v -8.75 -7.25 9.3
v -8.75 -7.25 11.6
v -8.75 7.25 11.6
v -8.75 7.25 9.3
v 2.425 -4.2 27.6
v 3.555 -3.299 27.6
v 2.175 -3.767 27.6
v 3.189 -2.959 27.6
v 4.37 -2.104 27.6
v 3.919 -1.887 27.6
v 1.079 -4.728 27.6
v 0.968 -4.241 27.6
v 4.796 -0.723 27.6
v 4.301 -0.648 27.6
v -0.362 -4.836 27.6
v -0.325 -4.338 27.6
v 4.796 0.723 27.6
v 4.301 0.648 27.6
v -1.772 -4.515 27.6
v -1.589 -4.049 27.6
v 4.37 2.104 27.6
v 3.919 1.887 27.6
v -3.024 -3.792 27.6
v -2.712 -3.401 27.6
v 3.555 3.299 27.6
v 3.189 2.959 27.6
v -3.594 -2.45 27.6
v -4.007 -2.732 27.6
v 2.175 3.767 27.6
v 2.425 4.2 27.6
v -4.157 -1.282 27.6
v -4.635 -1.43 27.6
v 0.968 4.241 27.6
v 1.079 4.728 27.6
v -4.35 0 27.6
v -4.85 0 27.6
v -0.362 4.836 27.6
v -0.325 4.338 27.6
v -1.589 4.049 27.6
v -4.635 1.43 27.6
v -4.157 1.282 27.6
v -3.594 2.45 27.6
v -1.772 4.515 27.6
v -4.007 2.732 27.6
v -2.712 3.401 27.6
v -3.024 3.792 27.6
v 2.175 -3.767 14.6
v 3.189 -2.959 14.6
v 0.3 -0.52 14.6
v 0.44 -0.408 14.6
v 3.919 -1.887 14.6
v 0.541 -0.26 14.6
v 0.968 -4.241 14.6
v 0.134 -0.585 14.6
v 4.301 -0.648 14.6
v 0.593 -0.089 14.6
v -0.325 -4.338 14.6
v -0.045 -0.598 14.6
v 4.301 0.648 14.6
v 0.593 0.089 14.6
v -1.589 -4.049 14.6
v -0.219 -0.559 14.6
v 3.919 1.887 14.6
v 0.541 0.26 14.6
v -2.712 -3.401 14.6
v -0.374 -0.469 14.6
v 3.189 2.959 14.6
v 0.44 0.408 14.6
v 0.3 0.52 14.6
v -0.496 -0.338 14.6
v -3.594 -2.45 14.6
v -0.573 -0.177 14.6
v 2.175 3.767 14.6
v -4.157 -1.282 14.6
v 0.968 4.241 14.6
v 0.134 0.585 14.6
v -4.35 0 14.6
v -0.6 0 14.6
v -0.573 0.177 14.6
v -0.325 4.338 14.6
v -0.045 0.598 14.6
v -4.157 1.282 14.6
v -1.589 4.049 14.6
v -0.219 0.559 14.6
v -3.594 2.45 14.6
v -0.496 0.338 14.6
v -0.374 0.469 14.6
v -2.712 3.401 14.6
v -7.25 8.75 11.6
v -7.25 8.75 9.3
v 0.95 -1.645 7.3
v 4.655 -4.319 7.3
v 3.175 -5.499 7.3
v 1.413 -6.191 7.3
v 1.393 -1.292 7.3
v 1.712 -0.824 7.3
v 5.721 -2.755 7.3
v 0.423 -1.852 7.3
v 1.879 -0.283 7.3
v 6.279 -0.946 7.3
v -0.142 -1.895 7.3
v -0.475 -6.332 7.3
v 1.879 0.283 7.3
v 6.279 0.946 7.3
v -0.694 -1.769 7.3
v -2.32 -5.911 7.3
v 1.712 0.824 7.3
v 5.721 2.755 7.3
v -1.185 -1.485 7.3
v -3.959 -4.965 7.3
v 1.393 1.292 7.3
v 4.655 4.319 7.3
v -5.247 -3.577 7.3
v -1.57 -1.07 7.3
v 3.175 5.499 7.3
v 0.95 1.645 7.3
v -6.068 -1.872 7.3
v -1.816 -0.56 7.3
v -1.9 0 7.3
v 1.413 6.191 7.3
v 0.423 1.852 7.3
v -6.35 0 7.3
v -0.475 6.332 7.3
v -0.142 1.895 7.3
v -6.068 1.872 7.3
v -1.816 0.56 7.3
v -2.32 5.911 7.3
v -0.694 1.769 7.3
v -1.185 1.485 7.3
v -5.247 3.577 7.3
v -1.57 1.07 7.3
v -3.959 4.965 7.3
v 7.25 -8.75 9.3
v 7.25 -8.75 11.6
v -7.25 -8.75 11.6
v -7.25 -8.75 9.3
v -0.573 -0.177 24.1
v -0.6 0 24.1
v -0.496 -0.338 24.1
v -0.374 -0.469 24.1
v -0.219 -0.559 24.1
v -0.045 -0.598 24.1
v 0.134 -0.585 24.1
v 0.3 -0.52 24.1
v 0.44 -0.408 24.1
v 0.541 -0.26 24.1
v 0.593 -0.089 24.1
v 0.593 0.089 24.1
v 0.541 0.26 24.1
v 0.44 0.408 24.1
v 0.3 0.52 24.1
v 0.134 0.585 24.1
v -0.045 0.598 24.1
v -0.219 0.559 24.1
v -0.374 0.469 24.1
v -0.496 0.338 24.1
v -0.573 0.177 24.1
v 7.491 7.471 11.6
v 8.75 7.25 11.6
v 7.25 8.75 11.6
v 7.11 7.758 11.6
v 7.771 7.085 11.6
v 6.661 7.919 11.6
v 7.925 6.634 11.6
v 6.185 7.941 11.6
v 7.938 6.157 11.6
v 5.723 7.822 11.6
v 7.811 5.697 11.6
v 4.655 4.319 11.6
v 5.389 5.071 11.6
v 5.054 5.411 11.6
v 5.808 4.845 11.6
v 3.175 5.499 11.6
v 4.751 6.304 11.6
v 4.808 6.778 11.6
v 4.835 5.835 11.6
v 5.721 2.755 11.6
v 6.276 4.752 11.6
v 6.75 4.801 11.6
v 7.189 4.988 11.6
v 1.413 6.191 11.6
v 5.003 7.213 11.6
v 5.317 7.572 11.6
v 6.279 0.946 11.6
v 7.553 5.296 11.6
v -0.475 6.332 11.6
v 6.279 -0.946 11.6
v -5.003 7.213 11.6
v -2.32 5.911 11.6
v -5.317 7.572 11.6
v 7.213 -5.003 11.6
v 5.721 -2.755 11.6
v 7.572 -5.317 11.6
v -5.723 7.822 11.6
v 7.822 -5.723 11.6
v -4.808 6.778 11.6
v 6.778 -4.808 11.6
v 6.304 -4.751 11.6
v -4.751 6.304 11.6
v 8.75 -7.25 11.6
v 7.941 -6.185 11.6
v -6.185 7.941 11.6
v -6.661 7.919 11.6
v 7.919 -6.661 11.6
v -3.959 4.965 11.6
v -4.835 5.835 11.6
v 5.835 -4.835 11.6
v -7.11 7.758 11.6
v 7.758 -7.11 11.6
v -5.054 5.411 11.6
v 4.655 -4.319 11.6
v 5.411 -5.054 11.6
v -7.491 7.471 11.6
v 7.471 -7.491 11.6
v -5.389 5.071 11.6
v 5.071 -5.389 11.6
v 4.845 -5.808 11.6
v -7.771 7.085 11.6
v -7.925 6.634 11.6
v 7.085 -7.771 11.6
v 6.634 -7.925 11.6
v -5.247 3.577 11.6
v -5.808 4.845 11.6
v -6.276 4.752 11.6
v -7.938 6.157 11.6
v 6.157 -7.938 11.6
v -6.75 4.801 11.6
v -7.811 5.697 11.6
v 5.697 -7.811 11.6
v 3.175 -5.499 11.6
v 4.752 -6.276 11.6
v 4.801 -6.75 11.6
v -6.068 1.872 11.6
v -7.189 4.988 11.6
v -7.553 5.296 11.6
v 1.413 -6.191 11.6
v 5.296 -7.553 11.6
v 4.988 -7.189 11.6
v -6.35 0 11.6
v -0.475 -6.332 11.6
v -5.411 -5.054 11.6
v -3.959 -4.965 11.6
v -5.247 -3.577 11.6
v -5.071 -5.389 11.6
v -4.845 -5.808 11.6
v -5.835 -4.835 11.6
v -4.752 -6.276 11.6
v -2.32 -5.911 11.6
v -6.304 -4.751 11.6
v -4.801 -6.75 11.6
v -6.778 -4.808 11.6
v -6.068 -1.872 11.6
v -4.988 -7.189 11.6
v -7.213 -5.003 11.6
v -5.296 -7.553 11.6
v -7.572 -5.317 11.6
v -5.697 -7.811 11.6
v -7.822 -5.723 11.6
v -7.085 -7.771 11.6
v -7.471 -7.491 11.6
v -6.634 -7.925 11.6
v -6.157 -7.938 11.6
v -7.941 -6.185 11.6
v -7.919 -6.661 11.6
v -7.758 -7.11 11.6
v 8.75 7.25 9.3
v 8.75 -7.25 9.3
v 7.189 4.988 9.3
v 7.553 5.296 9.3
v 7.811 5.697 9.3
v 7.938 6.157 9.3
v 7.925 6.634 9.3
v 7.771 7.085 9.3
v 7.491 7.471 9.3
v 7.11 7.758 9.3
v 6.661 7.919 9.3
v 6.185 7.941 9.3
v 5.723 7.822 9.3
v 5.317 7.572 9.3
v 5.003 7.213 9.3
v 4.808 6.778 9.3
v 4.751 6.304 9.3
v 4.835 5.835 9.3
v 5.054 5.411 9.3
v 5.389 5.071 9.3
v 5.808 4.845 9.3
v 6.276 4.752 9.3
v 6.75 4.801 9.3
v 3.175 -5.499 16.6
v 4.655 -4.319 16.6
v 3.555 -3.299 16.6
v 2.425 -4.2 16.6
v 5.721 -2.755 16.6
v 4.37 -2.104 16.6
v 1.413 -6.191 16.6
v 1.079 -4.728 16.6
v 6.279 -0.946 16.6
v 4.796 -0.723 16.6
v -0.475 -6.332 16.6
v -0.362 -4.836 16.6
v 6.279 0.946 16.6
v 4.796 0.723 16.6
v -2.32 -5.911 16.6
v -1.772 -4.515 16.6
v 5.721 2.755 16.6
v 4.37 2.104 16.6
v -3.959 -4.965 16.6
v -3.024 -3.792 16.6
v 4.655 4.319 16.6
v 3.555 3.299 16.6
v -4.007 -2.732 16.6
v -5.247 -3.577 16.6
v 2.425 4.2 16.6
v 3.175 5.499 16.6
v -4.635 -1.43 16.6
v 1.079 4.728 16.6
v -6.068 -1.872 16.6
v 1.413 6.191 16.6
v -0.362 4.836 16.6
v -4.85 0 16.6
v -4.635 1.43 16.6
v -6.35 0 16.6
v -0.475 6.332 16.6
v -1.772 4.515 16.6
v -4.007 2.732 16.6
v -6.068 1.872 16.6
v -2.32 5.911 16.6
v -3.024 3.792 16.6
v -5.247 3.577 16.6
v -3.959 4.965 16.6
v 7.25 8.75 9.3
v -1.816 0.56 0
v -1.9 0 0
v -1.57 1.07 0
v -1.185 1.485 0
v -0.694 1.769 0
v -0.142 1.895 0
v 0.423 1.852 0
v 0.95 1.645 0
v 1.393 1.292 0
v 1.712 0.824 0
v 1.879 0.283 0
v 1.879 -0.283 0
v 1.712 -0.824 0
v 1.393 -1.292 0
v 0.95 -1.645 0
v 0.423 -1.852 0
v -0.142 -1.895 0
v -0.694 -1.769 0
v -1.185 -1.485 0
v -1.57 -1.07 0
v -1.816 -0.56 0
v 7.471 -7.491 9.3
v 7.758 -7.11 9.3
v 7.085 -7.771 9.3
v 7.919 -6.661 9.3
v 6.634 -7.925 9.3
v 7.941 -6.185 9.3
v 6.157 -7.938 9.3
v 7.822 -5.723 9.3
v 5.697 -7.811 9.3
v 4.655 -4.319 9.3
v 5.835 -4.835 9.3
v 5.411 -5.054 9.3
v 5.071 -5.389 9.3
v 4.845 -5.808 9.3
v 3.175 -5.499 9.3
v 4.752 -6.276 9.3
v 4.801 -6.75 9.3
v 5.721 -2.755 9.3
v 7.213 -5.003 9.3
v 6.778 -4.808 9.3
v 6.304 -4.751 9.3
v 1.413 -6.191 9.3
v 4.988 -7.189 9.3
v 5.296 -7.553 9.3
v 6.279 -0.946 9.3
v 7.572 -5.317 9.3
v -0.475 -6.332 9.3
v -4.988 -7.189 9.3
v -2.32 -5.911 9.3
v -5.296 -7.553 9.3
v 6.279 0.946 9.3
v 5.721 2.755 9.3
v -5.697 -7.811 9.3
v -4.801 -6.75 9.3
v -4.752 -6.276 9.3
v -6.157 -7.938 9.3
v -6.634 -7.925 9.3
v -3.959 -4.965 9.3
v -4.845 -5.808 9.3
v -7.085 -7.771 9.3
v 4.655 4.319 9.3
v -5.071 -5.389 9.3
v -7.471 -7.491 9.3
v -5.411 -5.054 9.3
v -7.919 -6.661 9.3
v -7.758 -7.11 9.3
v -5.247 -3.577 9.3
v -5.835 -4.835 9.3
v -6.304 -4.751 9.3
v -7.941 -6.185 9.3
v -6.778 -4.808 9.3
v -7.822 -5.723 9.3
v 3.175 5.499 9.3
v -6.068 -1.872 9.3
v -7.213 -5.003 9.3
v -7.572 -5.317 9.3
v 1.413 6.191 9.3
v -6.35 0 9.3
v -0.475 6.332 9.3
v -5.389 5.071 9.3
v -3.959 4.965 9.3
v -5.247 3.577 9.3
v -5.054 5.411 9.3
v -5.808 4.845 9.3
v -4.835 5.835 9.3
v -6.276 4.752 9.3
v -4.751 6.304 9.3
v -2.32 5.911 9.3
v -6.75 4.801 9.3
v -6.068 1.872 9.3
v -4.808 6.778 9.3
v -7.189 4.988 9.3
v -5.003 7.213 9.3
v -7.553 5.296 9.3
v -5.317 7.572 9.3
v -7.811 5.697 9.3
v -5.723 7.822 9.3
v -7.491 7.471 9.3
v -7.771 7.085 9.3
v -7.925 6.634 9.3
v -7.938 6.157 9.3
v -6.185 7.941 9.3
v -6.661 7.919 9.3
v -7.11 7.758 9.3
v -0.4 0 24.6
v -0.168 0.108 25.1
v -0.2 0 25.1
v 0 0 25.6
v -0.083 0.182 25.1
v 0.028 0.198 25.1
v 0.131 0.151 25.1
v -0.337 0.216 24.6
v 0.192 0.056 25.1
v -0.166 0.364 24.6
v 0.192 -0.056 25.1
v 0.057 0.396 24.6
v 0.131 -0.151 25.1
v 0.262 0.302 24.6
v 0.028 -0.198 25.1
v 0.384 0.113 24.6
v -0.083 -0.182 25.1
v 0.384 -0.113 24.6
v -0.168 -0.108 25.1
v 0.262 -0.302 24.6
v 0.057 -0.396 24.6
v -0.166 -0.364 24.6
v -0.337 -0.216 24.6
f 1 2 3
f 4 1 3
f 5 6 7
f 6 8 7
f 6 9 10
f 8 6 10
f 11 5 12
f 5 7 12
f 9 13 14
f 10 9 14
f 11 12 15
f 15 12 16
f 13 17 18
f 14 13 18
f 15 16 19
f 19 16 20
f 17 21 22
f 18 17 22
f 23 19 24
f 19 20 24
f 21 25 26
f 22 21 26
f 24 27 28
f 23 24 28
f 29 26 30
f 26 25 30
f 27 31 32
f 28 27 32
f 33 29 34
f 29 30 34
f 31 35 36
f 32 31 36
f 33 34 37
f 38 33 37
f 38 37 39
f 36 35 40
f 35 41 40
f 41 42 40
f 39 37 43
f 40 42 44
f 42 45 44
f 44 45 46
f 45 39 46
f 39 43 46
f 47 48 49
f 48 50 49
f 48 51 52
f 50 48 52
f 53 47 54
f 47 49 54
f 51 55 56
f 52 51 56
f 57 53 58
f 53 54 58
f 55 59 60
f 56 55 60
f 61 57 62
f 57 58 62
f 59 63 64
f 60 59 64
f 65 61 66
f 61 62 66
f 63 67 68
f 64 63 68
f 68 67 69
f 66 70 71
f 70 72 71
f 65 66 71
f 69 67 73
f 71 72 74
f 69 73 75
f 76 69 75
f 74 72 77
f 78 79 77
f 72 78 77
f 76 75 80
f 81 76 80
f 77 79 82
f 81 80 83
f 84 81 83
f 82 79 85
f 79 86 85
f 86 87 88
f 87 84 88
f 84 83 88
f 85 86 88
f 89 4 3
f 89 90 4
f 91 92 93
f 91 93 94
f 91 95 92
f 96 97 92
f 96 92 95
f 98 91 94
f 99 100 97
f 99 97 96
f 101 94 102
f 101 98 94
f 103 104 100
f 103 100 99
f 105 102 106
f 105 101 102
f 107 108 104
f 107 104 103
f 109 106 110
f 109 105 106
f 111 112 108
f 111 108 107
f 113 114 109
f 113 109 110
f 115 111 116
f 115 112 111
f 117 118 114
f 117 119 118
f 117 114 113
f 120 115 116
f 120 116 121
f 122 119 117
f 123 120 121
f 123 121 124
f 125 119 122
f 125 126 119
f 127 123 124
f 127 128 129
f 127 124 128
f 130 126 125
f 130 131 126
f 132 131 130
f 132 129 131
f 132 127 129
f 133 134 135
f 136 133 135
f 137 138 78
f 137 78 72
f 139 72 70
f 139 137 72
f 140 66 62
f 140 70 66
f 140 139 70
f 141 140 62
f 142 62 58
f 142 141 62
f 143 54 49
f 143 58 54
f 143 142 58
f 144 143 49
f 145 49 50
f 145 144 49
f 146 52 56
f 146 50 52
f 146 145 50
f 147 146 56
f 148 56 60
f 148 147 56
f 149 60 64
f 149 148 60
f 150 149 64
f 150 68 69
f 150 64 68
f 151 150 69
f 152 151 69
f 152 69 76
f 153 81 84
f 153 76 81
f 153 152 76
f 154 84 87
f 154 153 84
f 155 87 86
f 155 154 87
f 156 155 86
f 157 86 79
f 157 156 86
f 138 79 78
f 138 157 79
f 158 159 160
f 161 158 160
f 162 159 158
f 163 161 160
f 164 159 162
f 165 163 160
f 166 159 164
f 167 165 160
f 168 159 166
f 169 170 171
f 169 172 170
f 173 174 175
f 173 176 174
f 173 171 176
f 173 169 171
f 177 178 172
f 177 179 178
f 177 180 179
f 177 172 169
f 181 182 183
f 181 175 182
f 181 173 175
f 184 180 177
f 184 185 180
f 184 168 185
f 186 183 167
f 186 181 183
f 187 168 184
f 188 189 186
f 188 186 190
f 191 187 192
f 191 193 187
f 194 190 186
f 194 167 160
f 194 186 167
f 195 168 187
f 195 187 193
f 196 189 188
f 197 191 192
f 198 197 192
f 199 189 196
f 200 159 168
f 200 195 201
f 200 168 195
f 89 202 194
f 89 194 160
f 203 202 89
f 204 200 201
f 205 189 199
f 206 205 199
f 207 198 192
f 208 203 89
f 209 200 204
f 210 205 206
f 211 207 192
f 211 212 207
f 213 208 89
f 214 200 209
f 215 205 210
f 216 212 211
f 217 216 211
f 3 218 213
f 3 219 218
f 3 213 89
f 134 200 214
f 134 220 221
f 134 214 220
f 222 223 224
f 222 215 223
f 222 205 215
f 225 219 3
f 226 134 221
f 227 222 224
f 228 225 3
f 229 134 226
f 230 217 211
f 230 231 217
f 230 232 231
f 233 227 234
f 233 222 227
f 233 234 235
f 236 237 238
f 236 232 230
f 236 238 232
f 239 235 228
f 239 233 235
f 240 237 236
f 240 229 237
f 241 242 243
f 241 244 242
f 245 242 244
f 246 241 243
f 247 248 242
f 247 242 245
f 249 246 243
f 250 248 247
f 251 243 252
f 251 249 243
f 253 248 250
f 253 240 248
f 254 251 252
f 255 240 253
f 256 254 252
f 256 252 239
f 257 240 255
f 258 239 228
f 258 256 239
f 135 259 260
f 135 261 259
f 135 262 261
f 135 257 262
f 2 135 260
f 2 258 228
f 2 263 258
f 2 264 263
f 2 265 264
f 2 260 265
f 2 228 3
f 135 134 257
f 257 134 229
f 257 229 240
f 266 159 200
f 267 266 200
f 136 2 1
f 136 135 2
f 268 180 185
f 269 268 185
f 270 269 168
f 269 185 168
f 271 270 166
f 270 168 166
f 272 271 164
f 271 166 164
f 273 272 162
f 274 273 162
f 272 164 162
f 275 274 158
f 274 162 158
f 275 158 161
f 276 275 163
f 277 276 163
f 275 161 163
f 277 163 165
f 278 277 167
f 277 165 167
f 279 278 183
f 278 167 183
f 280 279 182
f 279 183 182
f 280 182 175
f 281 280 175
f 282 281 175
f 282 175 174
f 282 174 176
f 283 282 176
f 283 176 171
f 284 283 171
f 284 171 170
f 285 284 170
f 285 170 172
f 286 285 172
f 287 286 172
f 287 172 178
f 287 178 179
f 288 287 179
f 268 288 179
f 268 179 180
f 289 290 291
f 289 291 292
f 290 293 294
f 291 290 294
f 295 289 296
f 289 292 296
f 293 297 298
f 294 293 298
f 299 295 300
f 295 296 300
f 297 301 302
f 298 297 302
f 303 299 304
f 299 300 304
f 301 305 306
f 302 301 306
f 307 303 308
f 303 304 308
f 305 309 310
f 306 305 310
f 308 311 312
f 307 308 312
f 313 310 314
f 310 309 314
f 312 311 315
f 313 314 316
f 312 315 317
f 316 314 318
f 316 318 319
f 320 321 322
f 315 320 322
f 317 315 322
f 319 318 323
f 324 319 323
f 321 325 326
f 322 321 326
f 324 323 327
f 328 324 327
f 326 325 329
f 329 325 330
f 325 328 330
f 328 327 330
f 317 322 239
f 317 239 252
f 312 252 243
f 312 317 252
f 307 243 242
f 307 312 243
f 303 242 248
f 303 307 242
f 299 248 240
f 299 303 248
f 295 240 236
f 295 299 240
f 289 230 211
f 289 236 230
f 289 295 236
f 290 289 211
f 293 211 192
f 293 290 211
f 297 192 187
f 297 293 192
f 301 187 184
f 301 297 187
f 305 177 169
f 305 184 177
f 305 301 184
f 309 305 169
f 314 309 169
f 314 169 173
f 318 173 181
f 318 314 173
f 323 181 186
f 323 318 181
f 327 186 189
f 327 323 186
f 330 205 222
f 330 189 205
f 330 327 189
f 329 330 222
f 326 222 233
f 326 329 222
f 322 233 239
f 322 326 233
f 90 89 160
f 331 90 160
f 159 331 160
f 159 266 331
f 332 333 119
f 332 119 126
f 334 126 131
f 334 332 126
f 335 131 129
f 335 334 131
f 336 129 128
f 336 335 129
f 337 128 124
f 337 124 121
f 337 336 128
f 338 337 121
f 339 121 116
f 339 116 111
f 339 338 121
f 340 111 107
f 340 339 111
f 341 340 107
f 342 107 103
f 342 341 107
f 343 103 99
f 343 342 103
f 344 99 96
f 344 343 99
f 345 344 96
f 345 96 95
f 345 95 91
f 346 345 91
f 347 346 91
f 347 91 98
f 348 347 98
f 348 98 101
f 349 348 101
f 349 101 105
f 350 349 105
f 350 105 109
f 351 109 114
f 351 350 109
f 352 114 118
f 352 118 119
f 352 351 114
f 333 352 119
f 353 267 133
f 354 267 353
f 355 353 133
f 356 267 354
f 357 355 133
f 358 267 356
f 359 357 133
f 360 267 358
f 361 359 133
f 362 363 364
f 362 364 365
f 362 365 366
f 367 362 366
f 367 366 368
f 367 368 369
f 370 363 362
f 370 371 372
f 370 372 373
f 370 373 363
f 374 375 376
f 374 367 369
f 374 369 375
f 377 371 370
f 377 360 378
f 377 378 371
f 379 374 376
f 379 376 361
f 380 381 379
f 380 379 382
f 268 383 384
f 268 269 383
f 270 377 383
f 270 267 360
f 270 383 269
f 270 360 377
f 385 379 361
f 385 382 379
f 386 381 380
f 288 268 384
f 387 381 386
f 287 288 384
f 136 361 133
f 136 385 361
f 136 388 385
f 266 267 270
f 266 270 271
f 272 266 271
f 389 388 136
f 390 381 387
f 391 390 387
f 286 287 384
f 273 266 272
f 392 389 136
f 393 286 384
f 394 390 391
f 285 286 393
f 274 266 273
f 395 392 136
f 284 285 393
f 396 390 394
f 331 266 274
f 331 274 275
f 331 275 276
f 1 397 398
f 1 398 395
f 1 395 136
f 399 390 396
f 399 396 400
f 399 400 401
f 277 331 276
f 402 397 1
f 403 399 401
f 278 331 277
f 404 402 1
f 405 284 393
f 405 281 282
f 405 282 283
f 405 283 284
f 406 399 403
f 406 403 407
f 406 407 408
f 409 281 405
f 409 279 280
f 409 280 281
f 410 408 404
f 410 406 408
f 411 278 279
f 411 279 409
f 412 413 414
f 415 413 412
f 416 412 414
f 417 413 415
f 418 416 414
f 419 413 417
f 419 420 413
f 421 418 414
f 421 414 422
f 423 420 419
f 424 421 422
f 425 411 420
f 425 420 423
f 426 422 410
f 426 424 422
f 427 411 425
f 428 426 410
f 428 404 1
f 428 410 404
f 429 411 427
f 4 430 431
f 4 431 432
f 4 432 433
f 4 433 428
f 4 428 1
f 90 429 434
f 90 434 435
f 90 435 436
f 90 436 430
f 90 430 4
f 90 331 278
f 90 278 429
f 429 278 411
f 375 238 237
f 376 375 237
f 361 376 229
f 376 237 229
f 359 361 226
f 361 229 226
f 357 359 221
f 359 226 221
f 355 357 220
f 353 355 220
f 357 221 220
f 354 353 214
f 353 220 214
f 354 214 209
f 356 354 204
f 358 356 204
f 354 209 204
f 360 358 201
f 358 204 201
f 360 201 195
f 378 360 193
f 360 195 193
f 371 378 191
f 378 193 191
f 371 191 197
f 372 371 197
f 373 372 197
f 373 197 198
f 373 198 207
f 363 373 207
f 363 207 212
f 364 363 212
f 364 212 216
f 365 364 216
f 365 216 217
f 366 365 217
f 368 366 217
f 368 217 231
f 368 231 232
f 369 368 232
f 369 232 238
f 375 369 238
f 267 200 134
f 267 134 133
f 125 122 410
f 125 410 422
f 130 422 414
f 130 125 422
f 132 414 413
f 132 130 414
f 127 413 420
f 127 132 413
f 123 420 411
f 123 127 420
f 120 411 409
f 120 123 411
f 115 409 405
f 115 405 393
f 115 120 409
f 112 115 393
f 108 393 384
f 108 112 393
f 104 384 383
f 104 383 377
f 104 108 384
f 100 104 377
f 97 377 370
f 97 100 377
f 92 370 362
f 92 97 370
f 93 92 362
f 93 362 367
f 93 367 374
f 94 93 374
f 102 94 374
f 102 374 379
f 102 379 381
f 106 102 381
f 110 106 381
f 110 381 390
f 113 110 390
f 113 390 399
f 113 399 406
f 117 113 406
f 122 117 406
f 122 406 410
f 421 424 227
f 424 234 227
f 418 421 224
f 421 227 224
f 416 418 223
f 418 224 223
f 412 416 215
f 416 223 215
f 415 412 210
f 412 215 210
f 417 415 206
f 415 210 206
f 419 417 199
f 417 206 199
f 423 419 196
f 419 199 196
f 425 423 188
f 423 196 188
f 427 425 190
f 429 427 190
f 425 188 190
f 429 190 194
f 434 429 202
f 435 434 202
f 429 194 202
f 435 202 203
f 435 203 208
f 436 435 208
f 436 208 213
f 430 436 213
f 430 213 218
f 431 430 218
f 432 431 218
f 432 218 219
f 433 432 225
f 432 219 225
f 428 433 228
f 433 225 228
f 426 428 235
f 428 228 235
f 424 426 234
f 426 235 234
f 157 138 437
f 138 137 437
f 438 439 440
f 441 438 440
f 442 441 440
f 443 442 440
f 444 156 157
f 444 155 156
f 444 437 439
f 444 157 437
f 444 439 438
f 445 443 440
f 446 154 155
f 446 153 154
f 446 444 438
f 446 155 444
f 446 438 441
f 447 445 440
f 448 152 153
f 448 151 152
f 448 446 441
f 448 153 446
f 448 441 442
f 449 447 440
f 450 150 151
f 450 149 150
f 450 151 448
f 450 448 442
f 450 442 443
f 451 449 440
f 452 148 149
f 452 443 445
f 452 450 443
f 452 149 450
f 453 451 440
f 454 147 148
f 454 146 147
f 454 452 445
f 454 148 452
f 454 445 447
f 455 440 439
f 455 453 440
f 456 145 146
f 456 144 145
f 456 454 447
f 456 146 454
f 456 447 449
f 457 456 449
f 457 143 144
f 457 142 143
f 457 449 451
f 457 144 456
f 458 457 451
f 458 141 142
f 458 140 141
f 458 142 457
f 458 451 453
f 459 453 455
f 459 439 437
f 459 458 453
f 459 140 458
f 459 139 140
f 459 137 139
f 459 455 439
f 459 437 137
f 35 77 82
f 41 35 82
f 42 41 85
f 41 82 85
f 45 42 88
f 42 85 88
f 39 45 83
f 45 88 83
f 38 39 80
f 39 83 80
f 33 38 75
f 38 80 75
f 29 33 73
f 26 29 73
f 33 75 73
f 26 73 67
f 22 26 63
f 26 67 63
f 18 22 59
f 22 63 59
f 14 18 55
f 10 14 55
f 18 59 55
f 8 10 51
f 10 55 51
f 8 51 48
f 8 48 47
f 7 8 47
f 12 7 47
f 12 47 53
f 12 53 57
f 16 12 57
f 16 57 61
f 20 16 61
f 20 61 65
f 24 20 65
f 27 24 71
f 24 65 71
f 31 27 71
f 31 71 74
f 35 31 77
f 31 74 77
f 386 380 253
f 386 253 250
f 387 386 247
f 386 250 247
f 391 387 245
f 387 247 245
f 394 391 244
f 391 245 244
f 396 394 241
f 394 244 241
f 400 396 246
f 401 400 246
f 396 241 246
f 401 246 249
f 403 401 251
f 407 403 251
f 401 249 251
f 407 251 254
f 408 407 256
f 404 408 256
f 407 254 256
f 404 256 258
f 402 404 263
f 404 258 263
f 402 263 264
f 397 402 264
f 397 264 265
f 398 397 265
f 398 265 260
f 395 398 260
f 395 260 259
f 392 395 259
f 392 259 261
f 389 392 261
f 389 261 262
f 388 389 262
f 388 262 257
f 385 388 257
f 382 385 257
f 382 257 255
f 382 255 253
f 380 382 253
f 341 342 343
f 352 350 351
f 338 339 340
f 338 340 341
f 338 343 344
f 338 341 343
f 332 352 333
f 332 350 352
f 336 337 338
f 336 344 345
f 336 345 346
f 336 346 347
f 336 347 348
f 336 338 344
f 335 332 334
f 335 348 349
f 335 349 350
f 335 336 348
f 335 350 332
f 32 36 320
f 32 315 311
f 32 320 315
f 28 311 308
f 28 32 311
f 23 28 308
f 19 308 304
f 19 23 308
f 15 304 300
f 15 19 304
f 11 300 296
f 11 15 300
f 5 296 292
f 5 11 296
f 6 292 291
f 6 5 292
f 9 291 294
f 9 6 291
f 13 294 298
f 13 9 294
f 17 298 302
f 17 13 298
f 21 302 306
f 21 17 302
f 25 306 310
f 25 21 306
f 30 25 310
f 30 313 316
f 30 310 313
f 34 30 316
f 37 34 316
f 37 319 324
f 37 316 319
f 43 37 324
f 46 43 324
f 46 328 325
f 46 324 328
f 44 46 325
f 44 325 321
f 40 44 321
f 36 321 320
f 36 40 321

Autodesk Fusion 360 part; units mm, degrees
sketch "Sketch1" plane through (0, 0, 0) normal (0, 1, 0) x (1, 0, 0) in component "BNC 4-hole panel mount"
  line L0 (-6.35, -9.3) -> (-8.75, -9.3)
  line L1 (-8.75, -9.3) -> (-8.75, -11.6)
  line L2 (-8.75, -11.6) -> (-6.35, -11.6)
  line L3 (-6.35, -11.6) -> (-6.35, -16.6)
  line L4 (-6.35, -16.6) -> (-4.85, -16.6)
  line L5 (-4.85, -16.6) -> (-4.85, -27.6)
  line L6 (0, -27.6) -> (0, 0)
  line L7 (-6.35, -9.3) -> (-6.35, -7.3)
  line L8 (-6.35, -7.3) -> (-1.9, -7.3)
  line L9 (-1.9, -7.3) -> (-1.9, 0)
  line L10 (0, 0) -> (-1.9, 0)
  line L11 (-4.85, -27.6) -> (-4.35, -27.6)
  line L12 (-4.35, -27.6) -> (-4.35, -14.6)
  line L13 (-4.35, -14.6) -> (-0.6, -14.6)
  line L14 (-0.6, -14.6) -> (-0.6, -24.1)
  line L15 (-0.6, -24.1) -> (0, -25.6)
  dimension "d3" = 1.9
  dimension "d4" = 2.3
  dimension "d5" = 5
  dimension "d6" = 8.75
  dimension "d9" = 4.85
  dimension "d10" = 6.35
  dimension "d11" = 2
  dimension "d21" = 0.5
  dimension "d22" = 0.6
  dimension "d23" = 1.5
  dimension "d24" = 13
  dimension "d25" = 27.6
  dimension "d26" = 11
  dimension "d27" = 16
revolve "Revolve1" add sketch "Sketch1" angle 360 about axis through (0, 0, 27.6) along (0, 0, -1) in component "BNC 4-hole panel mount"
sketch "Sketch2" plane through (0, 0, 11.6) normal (0, 0, 1) x (-1, 0, 0) in component "BNC 4-hole panel mount"
  circle A0 centre (0, 0) radius 6.35
  circle A1 centre (0, 0) radius 8.75
  line L0 (8.75, -8.75) -> (-8.75, -8.75)
  line L1 (-8.75, -8.75) -> (-8.75, 8.75)
  line L2 (-8.75, 8.75) -> (8.75, 8.75)
  line L3 (8.75, 8.75) -> (8.75, -8.75)
  line L4 (8.75, -8.75) -> (-8.75, 8.75) construction
  line L5 (-8.75, -8.75) -> (8.75, 8.75) construction
  circle A2 centre (6.35, 6.35) radius 1.6
  circle A3 centre (6.35, -6.35) radius 1.6
  circle A4 centre (-6.35, -6.35) radius 1.6
  circle A5 centre (-6.35, 6.35) radius 1.6
  circle A6 centre (0, 0) radius 6.35
  dimension "d13" = 17.5
  dimension "d14" = 17.5
  dimension "d15" = 3.2
  dimension "d16" = 12.7
extrude "Extrude1" add sketch "Sketch2" against normal up to surface (2.3 mm away) contours A1 A2 A3 A4 A5 | A1 L0 L3 A3 | A1 L2 L3 A2 | A1 L1 L2 A5 | A1 L0 L1 A4 in component "BNC 4-hole panel mount"
extrude "Extrude2" cut sketch "Sketch2" against normal up to surface (2.3 mm away) contours A1 A2 | A1 A3 | A1 A5 | A1 A4 picked at (5.857, 5.857) picked at (5.857, -5.857) picked at (-5.8818, 5.8337) picked at (-5.8818, -5.8337) in component "BNC 4-hole panel mount"
chamfer "Chamfer1" distance 1.5 angle 45 4 edges at (8.75, -8.75, 10.45) (-8.75, -8.75, 10.45) (-8.75, 8.75, 10.45) (8.75, 8.75, 10.45) in component "BNC 4-hole panel mount"
component "BNC 4-hole panel mount" placed x (1, 0, 0) y (0, 1, 0) z (0, 0, 1) at (0, 0, 0)
equation "d14 = d13"
